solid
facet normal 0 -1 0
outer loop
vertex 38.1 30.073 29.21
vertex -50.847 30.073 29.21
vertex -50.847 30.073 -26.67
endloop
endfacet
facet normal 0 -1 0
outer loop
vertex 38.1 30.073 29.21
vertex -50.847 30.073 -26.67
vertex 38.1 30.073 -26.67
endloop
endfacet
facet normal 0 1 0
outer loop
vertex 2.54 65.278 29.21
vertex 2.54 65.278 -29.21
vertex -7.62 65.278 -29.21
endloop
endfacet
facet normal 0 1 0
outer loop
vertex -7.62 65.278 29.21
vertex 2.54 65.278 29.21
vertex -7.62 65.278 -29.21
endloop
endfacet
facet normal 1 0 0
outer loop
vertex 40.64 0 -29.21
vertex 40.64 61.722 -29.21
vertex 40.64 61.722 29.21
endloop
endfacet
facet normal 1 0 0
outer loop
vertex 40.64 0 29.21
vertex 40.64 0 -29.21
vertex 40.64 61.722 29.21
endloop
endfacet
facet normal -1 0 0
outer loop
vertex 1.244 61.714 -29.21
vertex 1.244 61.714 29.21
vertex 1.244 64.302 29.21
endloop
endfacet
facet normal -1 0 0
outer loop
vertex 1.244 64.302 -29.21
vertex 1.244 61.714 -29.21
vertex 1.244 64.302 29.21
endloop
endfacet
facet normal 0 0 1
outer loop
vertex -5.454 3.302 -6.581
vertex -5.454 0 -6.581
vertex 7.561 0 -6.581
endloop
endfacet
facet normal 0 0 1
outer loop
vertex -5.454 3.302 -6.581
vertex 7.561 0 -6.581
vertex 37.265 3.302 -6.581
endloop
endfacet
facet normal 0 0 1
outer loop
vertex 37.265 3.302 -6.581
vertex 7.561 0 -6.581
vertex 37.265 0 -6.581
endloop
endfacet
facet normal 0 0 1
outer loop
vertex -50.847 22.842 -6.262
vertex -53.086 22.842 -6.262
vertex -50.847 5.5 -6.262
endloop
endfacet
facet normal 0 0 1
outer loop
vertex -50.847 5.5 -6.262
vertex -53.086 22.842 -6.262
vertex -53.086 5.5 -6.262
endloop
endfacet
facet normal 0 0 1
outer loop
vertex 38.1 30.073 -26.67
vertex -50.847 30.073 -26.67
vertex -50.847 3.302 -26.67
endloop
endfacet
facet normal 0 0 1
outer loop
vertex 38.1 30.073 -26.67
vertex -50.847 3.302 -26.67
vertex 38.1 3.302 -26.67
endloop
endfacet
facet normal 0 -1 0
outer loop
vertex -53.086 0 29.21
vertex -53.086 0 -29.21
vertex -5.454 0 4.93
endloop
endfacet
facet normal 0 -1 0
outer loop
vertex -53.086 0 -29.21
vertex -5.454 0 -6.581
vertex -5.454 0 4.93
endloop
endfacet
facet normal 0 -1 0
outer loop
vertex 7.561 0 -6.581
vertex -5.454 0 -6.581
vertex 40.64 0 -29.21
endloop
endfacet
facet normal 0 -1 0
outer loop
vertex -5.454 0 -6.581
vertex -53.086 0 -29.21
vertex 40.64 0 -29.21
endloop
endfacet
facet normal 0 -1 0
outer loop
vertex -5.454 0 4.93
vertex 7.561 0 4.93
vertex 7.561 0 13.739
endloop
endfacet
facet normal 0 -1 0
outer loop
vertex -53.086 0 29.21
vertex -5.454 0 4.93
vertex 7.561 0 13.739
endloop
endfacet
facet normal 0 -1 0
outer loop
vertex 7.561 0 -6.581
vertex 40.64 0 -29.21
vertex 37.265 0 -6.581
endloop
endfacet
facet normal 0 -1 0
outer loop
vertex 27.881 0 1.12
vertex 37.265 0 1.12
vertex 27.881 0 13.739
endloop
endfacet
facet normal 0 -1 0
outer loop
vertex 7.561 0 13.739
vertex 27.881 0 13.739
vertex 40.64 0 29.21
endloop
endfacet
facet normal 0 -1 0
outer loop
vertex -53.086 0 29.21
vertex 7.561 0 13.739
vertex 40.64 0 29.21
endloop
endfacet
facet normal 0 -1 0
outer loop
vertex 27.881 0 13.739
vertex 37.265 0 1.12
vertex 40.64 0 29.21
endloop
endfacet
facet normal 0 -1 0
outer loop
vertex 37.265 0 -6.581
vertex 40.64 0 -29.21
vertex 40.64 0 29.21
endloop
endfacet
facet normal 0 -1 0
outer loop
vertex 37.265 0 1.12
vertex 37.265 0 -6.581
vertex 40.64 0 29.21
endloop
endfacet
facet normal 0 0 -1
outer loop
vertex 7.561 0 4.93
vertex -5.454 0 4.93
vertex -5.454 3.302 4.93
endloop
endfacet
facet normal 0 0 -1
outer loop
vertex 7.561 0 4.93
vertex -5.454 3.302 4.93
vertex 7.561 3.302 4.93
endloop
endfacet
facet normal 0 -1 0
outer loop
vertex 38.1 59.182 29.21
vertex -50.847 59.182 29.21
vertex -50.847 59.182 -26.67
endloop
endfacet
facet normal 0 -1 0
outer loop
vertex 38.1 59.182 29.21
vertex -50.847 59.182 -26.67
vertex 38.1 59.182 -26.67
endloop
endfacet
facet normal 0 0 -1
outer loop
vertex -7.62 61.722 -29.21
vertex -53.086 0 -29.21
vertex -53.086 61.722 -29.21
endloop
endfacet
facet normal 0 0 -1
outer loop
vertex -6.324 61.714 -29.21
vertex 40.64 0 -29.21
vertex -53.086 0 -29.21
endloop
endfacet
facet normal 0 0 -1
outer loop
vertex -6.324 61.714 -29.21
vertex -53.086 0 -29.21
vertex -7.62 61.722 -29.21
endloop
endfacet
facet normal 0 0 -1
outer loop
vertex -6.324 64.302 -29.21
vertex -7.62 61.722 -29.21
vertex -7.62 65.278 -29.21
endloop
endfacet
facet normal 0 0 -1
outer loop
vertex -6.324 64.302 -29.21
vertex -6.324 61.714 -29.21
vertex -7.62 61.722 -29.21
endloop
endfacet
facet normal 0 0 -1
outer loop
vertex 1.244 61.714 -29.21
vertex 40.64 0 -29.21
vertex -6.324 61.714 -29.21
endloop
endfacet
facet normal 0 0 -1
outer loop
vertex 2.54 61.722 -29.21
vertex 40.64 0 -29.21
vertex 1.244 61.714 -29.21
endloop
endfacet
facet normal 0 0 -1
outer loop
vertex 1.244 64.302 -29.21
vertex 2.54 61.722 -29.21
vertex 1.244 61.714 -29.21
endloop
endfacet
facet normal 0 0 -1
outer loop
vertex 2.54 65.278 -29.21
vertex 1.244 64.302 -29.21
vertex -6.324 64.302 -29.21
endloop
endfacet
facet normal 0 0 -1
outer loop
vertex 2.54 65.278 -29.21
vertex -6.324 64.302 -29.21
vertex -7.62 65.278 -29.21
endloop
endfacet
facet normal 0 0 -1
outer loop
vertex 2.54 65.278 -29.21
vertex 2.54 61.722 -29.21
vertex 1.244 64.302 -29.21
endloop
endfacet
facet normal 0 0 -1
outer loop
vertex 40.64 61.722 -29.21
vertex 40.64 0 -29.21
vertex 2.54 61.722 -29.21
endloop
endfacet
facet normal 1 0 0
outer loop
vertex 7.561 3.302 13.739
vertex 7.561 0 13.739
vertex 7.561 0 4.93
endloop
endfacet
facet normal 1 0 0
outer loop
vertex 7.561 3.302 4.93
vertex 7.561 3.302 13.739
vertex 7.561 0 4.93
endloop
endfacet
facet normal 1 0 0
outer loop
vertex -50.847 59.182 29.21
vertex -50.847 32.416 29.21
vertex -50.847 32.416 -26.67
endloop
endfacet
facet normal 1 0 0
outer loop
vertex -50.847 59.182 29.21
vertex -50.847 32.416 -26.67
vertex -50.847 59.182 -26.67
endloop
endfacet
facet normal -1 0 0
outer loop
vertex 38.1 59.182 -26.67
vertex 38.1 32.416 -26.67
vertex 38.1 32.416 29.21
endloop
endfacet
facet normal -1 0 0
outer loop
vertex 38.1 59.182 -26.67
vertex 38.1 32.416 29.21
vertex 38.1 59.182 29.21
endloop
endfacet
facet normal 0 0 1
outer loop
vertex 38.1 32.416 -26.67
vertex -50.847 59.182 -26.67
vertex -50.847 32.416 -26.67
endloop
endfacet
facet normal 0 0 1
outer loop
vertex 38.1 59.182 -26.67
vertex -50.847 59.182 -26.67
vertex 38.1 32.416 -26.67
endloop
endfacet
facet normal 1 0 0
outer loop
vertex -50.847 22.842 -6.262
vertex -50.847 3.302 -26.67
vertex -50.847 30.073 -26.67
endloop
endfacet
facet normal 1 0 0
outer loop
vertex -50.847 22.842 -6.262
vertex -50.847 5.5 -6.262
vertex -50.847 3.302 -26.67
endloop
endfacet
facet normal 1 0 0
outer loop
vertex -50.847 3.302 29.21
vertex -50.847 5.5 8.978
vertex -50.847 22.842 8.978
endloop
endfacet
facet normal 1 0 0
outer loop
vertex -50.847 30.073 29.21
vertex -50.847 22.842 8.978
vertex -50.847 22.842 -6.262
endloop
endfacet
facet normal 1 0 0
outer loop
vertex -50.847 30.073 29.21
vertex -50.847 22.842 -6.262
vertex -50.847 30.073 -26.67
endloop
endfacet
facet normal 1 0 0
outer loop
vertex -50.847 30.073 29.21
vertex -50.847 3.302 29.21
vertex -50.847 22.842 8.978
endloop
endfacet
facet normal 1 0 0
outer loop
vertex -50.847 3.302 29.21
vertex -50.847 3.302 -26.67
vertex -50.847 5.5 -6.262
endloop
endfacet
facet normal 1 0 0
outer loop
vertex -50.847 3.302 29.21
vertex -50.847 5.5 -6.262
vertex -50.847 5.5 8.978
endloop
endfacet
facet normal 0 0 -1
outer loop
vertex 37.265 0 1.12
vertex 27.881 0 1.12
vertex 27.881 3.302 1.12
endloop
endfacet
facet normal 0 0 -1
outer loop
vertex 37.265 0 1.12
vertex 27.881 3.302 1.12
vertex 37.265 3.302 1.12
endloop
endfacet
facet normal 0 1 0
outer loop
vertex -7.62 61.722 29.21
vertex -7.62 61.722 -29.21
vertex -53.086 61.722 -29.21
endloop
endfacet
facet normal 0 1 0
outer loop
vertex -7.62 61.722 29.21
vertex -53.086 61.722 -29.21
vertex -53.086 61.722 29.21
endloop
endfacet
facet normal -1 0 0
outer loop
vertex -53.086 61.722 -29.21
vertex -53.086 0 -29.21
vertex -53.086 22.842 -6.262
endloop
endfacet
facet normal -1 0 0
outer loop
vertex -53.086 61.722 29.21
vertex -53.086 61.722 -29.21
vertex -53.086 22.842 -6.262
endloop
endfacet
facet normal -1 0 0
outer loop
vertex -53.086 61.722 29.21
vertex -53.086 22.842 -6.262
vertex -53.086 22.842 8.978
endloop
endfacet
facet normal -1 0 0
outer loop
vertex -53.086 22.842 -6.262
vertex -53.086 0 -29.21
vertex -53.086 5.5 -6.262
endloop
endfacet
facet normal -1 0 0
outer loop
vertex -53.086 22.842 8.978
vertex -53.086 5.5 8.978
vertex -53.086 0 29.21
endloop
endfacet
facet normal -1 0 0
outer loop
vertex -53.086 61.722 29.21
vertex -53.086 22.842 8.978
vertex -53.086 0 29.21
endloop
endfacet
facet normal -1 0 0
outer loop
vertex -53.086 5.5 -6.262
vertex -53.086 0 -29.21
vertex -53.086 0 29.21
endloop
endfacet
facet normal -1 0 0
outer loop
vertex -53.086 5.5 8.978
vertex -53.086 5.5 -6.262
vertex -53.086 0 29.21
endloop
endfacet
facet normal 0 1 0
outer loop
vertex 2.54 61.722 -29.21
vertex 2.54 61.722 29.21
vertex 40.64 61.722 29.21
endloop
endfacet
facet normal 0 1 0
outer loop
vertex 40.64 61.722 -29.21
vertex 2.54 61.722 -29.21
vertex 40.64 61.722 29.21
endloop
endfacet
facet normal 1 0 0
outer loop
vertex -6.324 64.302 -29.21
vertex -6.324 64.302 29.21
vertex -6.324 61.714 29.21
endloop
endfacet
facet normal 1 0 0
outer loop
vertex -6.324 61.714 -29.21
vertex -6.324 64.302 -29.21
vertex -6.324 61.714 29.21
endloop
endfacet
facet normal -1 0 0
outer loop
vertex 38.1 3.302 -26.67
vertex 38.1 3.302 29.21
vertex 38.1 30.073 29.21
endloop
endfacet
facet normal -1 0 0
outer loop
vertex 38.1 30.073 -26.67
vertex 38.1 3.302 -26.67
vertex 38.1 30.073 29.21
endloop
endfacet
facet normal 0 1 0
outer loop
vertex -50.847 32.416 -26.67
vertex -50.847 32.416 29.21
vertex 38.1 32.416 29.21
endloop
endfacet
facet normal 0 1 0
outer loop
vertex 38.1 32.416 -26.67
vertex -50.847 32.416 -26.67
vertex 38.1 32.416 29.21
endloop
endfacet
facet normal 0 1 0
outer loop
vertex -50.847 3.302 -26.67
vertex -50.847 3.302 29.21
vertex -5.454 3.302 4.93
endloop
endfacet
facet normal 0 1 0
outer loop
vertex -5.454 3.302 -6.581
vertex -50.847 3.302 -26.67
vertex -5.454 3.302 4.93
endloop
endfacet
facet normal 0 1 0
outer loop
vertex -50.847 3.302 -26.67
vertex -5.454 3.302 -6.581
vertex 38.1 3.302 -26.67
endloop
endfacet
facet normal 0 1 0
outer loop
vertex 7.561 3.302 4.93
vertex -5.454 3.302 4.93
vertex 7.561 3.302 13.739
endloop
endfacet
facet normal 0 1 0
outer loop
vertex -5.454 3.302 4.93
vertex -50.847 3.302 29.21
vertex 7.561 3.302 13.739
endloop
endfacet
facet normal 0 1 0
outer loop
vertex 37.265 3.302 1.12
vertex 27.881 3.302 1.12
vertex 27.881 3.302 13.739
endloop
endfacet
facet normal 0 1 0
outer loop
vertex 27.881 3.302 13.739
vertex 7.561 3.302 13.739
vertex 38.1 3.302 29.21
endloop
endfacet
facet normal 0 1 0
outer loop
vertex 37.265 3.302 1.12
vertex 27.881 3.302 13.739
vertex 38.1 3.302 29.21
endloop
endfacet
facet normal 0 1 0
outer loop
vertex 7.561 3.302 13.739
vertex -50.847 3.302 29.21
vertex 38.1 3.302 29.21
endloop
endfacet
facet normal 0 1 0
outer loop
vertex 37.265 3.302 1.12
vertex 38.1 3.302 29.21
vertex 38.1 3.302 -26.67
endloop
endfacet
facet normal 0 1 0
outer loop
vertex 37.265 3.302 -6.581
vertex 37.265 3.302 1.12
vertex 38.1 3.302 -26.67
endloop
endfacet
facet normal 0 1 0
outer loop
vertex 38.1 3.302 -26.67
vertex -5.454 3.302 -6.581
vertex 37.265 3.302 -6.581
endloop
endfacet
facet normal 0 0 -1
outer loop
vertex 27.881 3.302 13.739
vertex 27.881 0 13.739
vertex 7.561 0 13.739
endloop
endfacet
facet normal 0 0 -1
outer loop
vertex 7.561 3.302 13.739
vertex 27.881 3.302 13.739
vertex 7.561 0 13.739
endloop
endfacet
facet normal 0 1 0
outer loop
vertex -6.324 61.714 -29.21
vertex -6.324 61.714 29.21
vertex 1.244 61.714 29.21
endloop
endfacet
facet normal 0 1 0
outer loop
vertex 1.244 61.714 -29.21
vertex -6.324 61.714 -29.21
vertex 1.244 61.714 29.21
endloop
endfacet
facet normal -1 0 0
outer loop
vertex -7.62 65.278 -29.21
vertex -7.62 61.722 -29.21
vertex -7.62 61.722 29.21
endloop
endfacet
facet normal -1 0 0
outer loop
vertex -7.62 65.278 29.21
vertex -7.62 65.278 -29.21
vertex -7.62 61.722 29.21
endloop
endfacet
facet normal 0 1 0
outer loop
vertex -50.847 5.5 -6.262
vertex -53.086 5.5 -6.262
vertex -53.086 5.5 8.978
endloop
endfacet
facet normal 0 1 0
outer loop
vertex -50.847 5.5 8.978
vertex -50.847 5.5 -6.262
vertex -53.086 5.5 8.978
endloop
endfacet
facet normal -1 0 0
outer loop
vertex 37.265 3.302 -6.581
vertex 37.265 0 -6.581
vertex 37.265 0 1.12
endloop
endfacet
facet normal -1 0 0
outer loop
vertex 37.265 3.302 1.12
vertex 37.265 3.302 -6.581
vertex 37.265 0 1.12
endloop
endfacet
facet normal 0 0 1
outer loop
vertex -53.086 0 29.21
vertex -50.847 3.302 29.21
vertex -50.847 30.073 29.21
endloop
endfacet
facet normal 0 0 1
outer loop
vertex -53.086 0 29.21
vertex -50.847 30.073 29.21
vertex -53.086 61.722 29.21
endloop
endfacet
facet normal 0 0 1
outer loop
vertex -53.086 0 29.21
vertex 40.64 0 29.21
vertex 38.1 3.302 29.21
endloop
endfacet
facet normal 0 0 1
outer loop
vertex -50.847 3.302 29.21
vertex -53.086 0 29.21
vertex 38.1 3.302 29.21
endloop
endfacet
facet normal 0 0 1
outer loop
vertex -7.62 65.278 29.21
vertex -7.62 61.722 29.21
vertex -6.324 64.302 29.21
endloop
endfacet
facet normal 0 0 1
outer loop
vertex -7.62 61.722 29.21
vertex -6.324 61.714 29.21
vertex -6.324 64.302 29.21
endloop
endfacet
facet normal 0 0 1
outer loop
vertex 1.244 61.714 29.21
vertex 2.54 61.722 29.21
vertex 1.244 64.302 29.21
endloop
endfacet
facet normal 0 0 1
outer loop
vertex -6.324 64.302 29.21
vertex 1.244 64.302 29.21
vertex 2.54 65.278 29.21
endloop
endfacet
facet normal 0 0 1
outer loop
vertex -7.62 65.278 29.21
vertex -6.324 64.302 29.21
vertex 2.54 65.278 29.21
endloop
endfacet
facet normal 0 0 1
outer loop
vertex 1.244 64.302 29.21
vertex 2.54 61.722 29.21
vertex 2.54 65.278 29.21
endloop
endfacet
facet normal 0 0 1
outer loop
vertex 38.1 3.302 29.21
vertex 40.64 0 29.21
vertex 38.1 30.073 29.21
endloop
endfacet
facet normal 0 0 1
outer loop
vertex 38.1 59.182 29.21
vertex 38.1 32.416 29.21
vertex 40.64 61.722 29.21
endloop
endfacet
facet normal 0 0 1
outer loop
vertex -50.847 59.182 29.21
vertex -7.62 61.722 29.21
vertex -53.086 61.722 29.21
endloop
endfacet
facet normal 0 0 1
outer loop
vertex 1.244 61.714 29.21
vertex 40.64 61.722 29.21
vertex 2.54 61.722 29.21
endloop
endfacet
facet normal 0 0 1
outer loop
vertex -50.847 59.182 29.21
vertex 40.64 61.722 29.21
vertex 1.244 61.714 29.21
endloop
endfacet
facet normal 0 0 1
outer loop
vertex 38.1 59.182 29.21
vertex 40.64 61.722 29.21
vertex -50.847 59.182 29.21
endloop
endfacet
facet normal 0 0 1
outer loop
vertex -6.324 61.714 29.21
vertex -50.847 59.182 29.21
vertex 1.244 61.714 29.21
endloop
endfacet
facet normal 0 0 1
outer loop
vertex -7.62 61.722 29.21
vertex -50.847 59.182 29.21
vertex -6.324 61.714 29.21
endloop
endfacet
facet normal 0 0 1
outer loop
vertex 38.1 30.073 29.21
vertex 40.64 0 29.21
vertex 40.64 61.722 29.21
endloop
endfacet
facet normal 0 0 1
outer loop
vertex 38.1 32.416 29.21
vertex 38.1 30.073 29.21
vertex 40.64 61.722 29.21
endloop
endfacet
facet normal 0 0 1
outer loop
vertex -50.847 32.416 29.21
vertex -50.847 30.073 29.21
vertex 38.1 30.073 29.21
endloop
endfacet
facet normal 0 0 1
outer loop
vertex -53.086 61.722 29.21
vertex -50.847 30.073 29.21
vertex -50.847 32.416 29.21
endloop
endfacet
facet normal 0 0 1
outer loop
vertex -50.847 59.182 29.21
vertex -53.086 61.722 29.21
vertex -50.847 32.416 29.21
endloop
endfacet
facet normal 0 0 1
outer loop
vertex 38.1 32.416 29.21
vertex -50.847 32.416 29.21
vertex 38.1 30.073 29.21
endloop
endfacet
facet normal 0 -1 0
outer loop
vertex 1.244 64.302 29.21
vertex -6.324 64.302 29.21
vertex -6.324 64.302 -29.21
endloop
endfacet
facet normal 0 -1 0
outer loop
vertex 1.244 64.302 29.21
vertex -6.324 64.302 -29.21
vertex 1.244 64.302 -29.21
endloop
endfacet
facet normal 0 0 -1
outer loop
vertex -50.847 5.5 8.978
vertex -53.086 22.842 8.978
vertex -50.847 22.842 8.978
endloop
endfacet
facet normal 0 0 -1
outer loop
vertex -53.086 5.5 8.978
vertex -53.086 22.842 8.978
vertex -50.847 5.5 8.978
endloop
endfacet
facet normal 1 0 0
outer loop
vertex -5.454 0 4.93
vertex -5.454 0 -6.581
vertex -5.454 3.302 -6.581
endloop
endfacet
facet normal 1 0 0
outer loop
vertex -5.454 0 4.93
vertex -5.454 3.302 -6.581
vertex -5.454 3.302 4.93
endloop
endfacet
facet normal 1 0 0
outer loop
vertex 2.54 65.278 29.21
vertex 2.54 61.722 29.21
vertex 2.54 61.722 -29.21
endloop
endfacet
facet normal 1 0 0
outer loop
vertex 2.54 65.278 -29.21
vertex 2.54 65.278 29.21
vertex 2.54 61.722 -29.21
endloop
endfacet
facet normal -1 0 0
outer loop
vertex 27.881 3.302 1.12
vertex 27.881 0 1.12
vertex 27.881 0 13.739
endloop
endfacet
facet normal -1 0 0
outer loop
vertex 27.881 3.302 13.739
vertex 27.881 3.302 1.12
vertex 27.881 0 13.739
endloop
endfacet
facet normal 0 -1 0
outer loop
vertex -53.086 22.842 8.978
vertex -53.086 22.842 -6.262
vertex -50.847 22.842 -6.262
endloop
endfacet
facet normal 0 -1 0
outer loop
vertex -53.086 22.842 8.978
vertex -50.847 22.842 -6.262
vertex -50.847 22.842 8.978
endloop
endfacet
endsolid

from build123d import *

# Parameters (mm, degrees)
F0_W      = 86.36
F0_H      = 58.42
F1_DEPTH  = 61.722
F2_W      = 13.0146164447
F2_H      = 11.5111361851
F2_W_2    = 9.3842569146
F2_H_2    = 7.7007600234
F3_DEPTH  = 56.642
F4_W      = 81.28
F4_H      = 55.88
F5_DEPTH  = 55.88
F6_W      = 81.28
F6_H      = 2.3422017694
F7_DEPTH  = 55.88
F8_W      = 10.16
F8_H      = 49.7436418003
F8_H_2    = 8.6763581997
F9_DEPTH  = 3.556
F10_W     = 7.5672202845
F10_H     = 1.6030113697
F10_H_2   = 0.9847168326
F11_DEPTH = 69.342
F12_DEPTH = 7.366
F13_W     = 7.66663257
F13_H     = 26.7714005868
F14_DEPTH = 55.88
F15_W     = 7.66663257
F15_H     = 26.7663976438
F16_DEPTH = 55.88
F17_W     = 17.341342
F17_H     = 15.24
F18_DEPTH = 25.4


with BuildPart() as f1:
    # F0 (on Front) → F1 (new body)
    with BuildSketch(Plane.XZ):
        with Locations((-2.54, 0)):
            Rectangle(F0_W, F0_H)
    extrude(amount=-F1_DEPTH)

    # F2 (on face) → F3 (cut)
    with BuildSketch(Plane.XZ):
        Polygon((27.8808352199, 13.7387597933), (7.5608352199, 13.7387597933), (7.5608352199, 4.9298959784), (7.5608352199, -6.5812402067), (27.8808352199, -6.5812402067), (27.8808352199, 1.1195198167), align=None)
        with Locations((1.0535269976, -0.8256721141)):
            Rectangle(F2_W, F2_H)
        with Locations((32.5729636772, -2.730860195)):
            Rectangle(F2_W_2, F2_H_2)
    extrude(amount=-F3_DEPTH, mode=Mode.SUBTRACT)

    # F4 (on face) → F5 (cut)
    with BuildSketch(Plane.XY.offset(29.21)):
        with Locations((-2.54, 31.242)):
            Rectangle(F4_W, F4_H)
    extrude(amount=-F5_DEPTH, mode=Mode.SUBTRACT)

    # F6 (on face) → F7 (join)
    with BuildSketch(Plane.XY.offset(-26.67)):
        with Locations((-2.54, 31.2445014715)):
            Rectangle(F6_W, F6_H)
    extrude(amount=F7_DEPTH)

    # F8 (on face) → F9 (join)
    with BuildSketch(Plane(origin=(0, 61.722, 0), x_dir=(-1, 0, 0), z_dir=(0, 1, 0))):
        with Locations((2.54, -4.3381790999)):
            Rectangle(F8_W, F8_H)
        with Locations((2.54, 24.8718209001)):
            Rectangle(F8_W, F8_H_2)
    extrude(amount=F9_DEPTH)

    # F10 (on face) → F11 (cut)
    with BuildSketch(Plane.XY.offset(29.21)):
        with Locations((-2.54, 63.5)):
            Rectangle(F10_W, F10_H)
        with Locations((-2.54, 62.2061358988)):
            Rectangle(F10_W, F10_H_2)
    extrude(amount=-F11_DEPTH, mode=Mode.SUBTRACT)

    # F12 (add): a face of the model
    f12_faces = [f1.faces().sort_by_distance(p)[0] for p in [
        (-45.72, 30.861, 0),
    ]]
    extrude(f12_faces, amount=F12_DEPTH)

    # F13 (on face) → F14 (cut)
    with BuildSketch(Plane.XY.offset(29.21)):
        with Locations((-47.013316285, 16.6877002934)):
            Rectangle(F13_W, F13_H)
    extrude(amount=-F14_DEPTH, mode=Mode.SUBTRACT)

    # F15 (on face) → F16 (cut)
    with BuildSketch(Plane.XY.offset(29.21)):
        with Locations((-47.013316285, 45.7988011781)):
            Rectangle(F15_W, F15_H)
    extrude(amount=-F16_DEPTH, mode=Mode.SUBTRACT)

    # F17 (on face) → F18 (cut)
    with BuildSketch(Plane(origin=(-53.086, 0, 0), x_dir=(0, -1, 0), z_dir=(-1, 0, 0))):
        with Locations((-14.1710711635, 1.3578335623)):
            Rectangle(F17_W, F17_H)
    extrude(amount=-F18_DEPTH, mode=Mode.SUBTRACT)


solid = f1.part
